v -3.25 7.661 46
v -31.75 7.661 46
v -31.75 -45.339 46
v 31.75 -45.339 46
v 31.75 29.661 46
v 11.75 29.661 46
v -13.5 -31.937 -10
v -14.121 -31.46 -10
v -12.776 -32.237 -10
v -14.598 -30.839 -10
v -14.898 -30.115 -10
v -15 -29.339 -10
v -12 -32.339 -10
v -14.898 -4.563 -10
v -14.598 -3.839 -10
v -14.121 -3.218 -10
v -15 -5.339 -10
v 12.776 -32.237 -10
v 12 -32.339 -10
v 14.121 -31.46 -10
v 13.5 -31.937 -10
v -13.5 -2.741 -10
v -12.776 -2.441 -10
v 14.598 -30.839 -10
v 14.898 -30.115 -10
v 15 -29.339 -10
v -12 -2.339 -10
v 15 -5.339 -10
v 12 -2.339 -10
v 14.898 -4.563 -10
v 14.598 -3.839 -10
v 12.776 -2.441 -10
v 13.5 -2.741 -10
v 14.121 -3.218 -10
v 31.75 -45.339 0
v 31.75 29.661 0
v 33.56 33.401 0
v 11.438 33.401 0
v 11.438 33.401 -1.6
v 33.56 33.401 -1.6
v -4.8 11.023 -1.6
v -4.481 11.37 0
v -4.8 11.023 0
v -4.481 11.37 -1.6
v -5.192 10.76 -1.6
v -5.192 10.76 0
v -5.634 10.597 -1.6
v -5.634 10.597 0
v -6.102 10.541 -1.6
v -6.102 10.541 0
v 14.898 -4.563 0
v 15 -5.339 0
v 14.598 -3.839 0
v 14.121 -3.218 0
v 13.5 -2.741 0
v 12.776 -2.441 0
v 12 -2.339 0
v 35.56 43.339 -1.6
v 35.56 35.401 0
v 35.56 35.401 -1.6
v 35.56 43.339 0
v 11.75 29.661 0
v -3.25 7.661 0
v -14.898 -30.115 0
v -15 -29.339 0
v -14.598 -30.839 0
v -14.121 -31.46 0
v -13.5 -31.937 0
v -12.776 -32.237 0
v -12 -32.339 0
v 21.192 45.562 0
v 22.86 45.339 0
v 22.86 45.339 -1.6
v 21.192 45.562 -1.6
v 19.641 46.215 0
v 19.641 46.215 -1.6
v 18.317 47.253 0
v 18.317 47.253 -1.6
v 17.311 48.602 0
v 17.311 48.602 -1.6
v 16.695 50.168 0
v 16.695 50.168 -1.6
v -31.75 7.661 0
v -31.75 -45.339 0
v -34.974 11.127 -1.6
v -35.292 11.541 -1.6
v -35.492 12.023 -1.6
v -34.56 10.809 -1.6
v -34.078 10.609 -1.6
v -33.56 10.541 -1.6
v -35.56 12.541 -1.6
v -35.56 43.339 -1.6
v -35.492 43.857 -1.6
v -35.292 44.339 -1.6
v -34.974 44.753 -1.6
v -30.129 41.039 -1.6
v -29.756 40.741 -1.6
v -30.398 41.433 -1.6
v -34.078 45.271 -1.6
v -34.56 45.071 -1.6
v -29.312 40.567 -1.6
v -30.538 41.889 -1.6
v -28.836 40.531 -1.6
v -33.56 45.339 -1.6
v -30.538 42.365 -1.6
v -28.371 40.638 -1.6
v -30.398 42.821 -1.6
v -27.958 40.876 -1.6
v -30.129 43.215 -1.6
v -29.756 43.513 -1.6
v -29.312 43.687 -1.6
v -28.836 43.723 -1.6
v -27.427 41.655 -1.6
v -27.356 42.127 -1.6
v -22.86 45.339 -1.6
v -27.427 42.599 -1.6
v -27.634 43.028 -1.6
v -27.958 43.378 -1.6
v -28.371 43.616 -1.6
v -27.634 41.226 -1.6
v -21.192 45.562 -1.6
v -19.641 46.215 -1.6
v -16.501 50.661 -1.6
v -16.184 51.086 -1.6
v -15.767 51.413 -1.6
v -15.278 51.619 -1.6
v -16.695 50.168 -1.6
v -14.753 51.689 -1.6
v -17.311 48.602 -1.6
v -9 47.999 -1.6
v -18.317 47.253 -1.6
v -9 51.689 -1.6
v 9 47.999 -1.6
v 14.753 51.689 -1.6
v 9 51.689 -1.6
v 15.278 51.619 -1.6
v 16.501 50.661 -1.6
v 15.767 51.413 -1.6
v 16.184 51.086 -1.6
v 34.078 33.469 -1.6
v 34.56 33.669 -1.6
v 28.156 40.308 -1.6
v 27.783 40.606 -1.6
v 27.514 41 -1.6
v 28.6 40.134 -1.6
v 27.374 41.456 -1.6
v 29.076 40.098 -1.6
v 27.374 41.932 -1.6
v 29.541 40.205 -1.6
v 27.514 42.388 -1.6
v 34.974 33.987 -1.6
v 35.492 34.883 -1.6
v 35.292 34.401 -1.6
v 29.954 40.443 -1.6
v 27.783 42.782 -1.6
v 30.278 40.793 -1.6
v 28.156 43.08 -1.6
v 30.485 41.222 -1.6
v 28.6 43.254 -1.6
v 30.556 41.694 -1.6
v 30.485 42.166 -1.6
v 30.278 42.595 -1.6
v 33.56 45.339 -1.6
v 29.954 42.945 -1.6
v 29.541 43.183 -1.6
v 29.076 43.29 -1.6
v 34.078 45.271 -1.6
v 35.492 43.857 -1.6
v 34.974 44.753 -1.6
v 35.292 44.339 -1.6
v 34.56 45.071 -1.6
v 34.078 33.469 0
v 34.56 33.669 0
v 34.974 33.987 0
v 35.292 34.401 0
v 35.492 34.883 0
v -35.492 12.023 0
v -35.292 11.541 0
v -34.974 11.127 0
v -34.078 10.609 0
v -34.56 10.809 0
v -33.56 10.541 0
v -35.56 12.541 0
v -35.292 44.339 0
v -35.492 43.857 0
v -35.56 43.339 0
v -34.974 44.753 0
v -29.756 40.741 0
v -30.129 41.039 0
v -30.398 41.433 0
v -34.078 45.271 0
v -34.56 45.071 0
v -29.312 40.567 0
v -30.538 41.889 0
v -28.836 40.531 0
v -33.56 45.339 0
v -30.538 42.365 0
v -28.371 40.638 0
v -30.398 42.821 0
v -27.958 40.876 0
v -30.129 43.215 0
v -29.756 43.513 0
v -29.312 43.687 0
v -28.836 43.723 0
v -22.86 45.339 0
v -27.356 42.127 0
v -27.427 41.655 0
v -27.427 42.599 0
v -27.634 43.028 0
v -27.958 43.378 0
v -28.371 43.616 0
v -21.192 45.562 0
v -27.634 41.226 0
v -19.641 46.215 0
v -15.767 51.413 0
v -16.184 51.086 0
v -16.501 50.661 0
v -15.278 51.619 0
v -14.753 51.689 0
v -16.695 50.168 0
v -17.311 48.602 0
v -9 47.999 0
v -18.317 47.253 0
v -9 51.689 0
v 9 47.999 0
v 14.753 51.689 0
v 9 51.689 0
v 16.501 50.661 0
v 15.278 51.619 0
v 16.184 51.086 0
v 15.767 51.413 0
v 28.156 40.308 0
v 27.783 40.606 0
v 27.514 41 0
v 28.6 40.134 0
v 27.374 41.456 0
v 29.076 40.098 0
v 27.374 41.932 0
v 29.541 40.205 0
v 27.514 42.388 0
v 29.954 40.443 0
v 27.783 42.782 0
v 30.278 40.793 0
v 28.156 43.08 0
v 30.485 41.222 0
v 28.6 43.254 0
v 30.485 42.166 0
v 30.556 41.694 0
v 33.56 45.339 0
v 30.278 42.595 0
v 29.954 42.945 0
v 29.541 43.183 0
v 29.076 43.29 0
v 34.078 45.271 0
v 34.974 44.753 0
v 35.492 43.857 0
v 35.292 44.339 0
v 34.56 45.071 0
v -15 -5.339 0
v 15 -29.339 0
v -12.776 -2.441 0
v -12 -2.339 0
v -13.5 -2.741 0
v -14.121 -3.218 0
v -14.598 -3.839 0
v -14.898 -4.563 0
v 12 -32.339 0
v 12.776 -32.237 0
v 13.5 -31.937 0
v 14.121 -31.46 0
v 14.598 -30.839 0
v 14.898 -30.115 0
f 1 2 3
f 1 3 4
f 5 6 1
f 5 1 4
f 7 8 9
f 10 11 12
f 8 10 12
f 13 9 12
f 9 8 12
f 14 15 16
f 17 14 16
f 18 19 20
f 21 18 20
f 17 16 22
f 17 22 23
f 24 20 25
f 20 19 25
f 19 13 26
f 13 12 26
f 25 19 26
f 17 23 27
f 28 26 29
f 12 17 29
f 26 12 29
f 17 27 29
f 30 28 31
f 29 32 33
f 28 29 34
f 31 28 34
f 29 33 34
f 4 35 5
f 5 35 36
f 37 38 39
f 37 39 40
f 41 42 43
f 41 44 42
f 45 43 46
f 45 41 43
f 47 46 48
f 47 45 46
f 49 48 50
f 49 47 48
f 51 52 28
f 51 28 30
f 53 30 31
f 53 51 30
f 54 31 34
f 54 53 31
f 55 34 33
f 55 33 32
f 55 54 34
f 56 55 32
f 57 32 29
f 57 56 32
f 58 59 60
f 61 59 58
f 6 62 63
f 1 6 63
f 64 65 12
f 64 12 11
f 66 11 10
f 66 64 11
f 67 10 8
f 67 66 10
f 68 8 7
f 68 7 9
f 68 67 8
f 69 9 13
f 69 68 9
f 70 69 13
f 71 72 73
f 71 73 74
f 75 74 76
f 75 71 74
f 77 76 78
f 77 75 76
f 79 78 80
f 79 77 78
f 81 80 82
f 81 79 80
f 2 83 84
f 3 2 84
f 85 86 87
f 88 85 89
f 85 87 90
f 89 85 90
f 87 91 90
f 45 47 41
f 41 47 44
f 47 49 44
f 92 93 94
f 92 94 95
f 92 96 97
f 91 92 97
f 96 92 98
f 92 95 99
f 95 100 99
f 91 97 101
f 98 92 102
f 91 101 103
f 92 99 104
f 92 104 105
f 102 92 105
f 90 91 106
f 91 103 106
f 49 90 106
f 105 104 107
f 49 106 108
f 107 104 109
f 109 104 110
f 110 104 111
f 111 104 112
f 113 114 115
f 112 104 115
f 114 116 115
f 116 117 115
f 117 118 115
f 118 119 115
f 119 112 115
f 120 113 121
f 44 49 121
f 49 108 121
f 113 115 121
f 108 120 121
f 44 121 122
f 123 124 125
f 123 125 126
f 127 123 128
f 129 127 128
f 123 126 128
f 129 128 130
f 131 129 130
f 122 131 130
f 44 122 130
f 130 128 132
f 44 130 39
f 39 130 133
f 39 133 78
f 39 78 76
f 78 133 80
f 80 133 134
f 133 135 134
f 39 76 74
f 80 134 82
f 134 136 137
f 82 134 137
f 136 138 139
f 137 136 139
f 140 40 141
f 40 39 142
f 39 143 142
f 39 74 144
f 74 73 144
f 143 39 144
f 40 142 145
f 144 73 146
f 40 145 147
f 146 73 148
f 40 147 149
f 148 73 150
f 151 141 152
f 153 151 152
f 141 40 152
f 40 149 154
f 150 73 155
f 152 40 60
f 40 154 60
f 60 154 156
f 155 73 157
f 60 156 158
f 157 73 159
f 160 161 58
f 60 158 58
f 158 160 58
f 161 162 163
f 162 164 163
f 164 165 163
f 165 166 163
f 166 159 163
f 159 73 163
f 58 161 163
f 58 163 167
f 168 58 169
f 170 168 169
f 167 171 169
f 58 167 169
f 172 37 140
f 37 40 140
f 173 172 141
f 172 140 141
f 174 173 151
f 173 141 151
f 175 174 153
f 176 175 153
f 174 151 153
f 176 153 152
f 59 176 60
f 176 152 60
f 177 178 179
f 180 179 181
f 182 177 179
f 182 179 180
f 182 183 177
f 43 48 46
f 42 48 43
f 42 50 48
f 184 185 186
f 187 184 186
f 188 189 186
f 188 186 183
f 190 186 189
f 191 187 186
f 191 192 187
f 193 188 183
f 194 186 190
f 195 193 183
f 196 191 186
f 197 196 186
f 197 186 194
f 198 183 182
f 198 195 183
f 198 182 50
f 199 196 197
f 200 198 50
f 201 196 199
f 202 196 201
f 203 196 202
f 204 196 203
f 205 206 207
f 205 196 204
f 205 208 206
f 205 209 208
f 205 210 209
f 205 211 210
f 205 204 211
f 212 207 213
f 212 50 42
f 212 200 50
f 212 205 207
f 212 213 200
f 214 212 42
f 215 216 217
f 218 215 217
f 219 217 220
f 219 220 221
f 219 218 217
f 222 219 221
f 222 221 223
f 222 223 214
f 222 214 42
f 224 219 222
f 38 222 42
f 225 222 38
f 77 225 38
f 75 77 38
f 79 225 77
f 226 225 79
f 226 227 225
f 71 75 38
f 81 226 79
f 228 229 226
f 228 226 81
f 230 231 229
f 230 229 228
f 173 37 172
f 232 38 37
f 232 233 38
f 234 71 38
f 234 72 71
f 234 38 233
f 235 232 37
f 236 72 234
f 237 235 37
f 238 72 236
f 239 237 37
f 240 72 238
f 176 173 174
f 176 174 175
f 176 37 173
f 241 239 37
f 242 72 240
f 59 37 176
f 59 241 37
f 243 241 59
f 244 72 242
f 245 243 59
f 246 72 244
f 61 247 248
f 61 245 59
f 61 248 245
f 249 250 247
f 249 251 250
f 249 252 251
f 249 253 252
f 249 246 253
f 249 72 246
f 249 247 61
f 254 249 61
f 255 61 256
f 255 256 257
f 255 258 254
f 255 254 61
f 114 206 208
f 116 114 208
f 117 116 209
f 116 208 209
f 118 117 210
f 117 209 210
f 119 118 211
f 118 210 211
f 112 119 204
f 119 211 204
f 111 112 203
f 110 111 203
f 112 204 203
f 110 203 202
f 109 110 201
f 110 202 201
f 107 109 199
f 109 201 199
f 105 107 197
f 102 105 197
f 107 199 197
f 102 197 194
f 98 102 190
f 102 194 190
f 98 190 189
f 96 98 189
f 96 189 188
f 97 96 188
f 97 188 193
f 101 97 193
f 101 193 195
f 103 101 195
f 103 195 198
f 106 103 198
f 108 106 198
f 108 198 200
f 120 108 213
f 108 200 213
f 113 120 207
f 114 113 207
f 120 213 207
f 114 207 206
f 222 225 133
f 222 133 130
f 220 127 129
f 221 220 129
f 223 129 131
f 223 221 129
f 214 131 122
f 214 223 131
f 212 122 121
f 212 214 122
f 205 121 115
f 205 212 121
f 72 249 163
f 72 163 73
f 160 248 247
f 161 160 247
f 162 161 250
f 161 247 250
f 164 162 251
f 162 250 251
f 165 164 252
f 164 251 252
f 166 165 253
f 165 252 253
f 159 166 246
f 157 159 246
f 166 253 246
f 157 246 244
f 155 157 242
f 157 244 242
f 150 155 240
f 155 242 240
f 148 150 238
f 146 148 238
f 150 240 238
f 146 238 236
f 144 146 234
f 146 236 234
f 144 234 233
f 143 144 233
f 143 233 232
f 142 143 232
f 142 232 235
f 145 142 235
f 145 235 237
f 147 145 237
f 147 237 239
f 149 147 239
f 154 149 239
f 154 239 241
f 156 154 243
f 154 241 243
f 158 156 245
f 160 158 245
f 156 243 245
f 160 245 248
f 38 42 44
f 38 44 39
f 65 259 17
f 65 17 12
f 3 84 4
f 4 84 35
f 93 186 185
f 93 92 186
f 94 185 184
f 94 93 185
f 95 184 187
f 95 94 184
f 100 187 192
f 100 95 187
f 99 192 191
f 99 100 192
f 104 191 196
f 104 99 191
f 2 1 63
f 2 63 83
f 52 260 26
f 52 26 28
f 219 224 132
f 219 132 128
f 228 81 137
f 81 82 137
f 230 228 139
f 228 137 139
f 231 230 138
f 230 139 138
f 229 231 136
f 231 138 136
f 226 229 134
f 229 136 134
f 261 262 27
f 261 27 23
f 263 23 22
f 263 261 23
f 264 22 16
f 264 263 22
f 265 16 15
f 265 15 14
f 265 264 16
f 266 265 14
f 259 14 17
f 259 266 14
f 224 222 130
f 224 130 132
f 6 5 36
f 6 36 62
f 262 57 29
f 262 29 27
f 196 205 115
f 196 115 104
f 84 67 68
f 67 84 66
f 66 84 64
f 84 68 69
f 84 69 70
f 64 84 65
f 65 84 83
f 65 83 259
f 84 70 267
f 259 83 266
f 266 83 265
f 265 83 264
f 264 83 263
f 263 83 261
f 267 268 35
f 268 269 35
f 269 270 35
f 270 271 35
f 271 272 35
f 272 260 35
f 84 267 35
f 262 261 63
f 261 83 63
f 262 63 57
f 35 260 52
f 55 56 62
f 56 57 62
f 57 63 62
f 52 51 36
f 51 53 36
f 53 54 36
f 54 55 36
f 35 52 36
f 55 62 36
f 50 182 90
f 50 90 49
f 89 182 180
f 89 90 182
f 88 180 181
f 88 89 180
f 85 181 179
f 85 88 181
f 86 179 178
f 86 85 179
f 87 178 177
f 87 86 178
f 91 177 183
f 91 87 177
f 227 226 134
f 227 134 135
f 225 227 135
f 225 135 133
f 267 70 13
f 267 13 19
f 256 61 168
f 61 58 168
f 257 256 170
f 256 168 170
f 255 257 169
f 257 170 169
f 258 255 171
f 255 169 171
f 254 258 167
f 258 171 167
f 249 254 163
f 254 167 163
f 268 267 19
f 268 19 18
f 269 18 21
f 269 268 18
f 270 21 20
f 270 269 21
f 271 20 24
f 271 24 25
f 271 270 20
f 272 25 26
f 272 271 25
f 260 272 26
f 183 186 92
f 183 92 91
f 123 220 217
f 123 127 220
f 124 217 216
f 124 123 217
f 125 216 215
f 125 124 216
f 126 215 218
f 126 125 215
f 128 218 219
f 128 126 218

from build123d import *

# Parameters (mm, degrees)
F0_R     = 1.6
F2_DEPTH = 1.6
F3_DEPTH = 19.05
F4_DEPTH = 46
F5_DEPTH = 10
F6_DEPTH = 1.016
F7_R     = 2


with BuildPart() as f2:
    # F0 (on Top) → F2 (new body)
    with BuildSketch(Plane.XY):
        with BuildLine():
            Line((11.4379320294, 33.401), (35.56, 33.401))
            Line((35.56, 33.401), (35.56, 45.339))
            Line((35.56, 45.339), (22.86, 45.339))
            ThreePointArc((22.86, 45.339), (18.3698719395, 47.1988719395), (16.51, 51.689))
            Line((16.51, 51.689), (9, 51.689))
            Line((9, 51.689), (9, 47.999))
            Line((9, 47.999), (-9, 47.999))
            Line((-9, 47.999), (-9, 51.689))
            Line((-9, 51.689), (-16.51, 51.689))
            ThreePointArc((-16.51, 51.689), (-18.3698719395, 47.1988719395), (-22.86, 45.339))
            Line((-22.86, 45.339), (-35.56, 45.339))
            Line((-35.56, 45.339), (-35.56, 10.541))
            Line((-35.56, 10.541), (-5.08, 10.541))
            Line((-5.08, 10.541), (11.4379320294, 33.401))
        make_face()
        with Locations((-28.956, 42.126997942)):
            Circle(F0_R, mode=Mode.SUBTRACT)
        with Locations((28.956, 41.694)):
            Circle(F0_R, mode=Mode.SUBTRACT)
    extrude(amount=-F2_DEPTH)

    # F1 (on Top) → F3 (cut)
    with BuildSketch(Plane.XY):
        with BuildLine():
            Line((-12, -32.339), (12, -32.339))
            ThreePointArc((12, -32.339), (14.1213203436, -31.4603203436), (15, -29.339))
            Line((15, -29.339), (15, -5.339))
            ThreePointArc((15, -5.339), (14.1213203436, -3.2176796564), (12, -2.339))
            Line((12, -2.339), (-12, -2.339))
            ThreePointArc((-12, -2.339), (-14.1213203436, -3.2176796564), (-15, -5.339))
            Line((-15, -5.339), (-15, -29.339))
            ThreePointArc((-15, -29.339), (-14.1213203436, -31.4603203436), (-12, -32.339))
        make_face()
    extrude(amount=-F3_DEPTH, mode=Mode.SUBTRACT)

    # F1 (on Top) → F6 (cut)
    with BuildSketch(Plane.XY):
        Polygon((-31.75, 7.661), (-31.75, -45.339), (31.75, -45.339), (31.75, 29.661), (11.75, 29.661), (-3.25, 7.661), align=None)
        with BuildLine():
            ThreePointArc((15, -29.339), (14.1213203436, -31.4603203436), (12, -32.339))
            Line((12, -32.339), (-12, -32.339))
            ThreePointArc((-12, -32.339), (-14.1213203436, -31.4603203436), (-15, -29.339))
            Line((-15, -29.339), (-15, -5.339))
            ThreePointArc((-15, -5.339), (-14.1213203436, -3.2176796564), (-12, -2.339))
            Line((-12, -2.339), (12, -2.339))
            ThreePointArc((12, -2.339), (14.1213203436, -3.2176796564), (15, -5.339))
            Line((15, -5.339), (15, -29.339))
        make_face(mode=Mode.SUBTRACT)
    extrude(amount=-F6_DEPTH, mode=Mode.SUBTRACT)

    # F7
    f7_edges = [f2.edges().sort_by_distance(p)[0] for p in [
        (-16.51, 51.689, -0.8),
        (-35.56, 45.339, -0.8),
        (-35.56, 10.541, -0.8),
        (-5.08, 10.541, -0.8),
        (35.56, 33.401, -0.8),
        (16.51, 51.689, -0.8),
        (35.56, 45.339, -0.8),
    ]]
    fillet(f7_edges, radius=F7_R)


with BuildPart() as f4:
    # F1 (on Top) → F4 (new body)
    with BuildSketch(Plane.XY):
        Polygon((-31.75, 7.661), (-31.75, -45.339), (31.75, -45.339), (31.75, 29.661), (11.75, 29.661), (-3.25, 7.661), align=None)
        with BuildLine():
            ThreePointArc((15, -29.339), (14.1213203436, -31.4603203436), (12, -32.339))
            Line((12, -32.339), (-12, -32.339))
            ThreePointArc((-12, -32.339), (-14.1213203436, -31.4603203436), (-15, -29.339))
            Line((-15, -29.339), (-15, -5.339))
            ThreePointArc((-15, -5.339), (-14.1213203436, -3.2176796564), (-12, -2.339))
            Line((-12, -2.339), (12, -2.339))
            ThreePointArc((12, -2.339), (14.1213203436, -3.2176796564), (15, -5.339))
            Line((15, -5.339), (15, -29.339))
        make_face(mode=Mode.SUBTRACT)
        with BuildLine():
            Line((-12, -32.339), (12, -32.339))
            ThreePointArc((12, -32.339), (14.1213203436, -31.4603203436), (15, -29.339))
            Line((15, -29.339), (15, -5.339))
            ThreePointArc((15, -5.339), (14.1213203436, -3.2176796564), (12, -2.339))
            Line((12, -2.339), (-12, -2.339))
            ThreePointArc((-12, -2.339), (-14.1213203436, -3.2176796564), (-15, -5.339))
            Line((-15, -5.339), (-15, -29.339))
            ThreePointArc((-15, -29.339), (-14.1213203436, -31.4603203436), (-12, -32.339))
        make_face()
    extrude(amount=F4_DEPTH)

    # F1 (on Top) → F5 (join)
    with BuildSketch(Plane.XY):
        with BuildLine():
            Line((-12, -32.339), (12, -32.339))
            ThreePointArc((12, -32.339), (14.1213203436, -31.4603203436), (15, -29.339))
            Line((15, -29.339), (15, -5.339))
            ThreePointArc((15, -5.339), (14.1213203436, -3.2176796564), (12, -2.339))
            Line((12, -2.339), (-12, -2.339))
            ThreePointArc((-12, -2.339), (-14.1213203436, -3.2176796564), (-15, -5.339))
            Line((-15, -5.339), (-15, -29.339))
            ThreePointArc((-15, -29.339), (-14.1213203436, -31.4603203436), (-12, -32.339))
        make_face()
    extrude(amount=-F5_DEPTH)


solid = Compound([f2.part, f4.part])
